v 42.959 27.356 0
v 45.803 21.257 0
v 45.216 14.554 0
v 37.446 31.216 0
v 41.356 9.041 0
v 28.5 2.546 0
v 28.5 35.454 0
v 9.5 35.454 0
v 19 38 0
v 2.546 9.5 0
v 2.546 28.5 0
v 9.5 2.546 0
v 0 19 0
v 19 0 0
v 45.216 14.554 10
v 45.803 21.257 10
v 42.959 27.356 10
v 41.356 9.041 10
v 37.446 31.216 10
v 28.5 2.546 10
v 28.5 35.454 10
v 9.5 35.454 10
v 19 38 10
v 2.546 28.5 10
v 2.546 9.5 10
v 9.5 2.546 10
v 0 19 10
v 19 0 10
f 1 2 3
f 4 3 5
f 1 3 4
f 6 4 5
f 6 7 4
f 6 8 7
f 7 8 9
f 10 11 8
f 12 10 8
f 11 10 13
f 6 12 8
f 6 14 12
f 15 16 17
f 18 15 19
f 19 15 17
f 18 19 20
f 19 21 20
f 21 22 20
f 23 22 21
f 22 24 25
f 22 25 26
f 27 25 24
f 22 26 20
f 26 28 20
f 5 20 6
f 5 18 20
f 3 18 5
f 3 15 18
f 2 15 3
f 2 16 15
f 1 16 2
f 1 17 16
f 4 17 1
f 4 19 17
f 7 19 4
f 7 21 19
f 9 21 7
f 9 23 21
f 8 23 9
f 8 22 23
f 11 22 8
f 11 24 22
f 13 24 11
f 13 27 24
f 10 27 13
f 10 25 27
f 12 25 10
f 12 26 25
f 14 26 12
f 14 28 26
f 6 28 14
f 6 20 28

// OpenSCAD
$fn = 32;

// ----------------------------------------------------------------------
// Eccentric disc: step, 10 mm thick
// ----------------------------------------------------------------------

// --- parameters (mm) ---
profile_height = 10;      // extrusion height
profile_points = 14;      // points of the closed outline

profile = [[0, 19], [2.546, 9.5], [9.5, 2.546], [19, 0], [28.5, 2.546], [41.356, 9.041], [45.216, 14.554], [45.803, 21.257], [42.959, 27.356], [37.446, 31.216], [28.5, 35.454], [19, 38], [9.5, 35.454], [2.546, 28.5]];  // single closed polygon, 14 points, counter clockwise

// --- the one profile operation ---
linear_extrude(height = profile_height) polygon(points = profile);
